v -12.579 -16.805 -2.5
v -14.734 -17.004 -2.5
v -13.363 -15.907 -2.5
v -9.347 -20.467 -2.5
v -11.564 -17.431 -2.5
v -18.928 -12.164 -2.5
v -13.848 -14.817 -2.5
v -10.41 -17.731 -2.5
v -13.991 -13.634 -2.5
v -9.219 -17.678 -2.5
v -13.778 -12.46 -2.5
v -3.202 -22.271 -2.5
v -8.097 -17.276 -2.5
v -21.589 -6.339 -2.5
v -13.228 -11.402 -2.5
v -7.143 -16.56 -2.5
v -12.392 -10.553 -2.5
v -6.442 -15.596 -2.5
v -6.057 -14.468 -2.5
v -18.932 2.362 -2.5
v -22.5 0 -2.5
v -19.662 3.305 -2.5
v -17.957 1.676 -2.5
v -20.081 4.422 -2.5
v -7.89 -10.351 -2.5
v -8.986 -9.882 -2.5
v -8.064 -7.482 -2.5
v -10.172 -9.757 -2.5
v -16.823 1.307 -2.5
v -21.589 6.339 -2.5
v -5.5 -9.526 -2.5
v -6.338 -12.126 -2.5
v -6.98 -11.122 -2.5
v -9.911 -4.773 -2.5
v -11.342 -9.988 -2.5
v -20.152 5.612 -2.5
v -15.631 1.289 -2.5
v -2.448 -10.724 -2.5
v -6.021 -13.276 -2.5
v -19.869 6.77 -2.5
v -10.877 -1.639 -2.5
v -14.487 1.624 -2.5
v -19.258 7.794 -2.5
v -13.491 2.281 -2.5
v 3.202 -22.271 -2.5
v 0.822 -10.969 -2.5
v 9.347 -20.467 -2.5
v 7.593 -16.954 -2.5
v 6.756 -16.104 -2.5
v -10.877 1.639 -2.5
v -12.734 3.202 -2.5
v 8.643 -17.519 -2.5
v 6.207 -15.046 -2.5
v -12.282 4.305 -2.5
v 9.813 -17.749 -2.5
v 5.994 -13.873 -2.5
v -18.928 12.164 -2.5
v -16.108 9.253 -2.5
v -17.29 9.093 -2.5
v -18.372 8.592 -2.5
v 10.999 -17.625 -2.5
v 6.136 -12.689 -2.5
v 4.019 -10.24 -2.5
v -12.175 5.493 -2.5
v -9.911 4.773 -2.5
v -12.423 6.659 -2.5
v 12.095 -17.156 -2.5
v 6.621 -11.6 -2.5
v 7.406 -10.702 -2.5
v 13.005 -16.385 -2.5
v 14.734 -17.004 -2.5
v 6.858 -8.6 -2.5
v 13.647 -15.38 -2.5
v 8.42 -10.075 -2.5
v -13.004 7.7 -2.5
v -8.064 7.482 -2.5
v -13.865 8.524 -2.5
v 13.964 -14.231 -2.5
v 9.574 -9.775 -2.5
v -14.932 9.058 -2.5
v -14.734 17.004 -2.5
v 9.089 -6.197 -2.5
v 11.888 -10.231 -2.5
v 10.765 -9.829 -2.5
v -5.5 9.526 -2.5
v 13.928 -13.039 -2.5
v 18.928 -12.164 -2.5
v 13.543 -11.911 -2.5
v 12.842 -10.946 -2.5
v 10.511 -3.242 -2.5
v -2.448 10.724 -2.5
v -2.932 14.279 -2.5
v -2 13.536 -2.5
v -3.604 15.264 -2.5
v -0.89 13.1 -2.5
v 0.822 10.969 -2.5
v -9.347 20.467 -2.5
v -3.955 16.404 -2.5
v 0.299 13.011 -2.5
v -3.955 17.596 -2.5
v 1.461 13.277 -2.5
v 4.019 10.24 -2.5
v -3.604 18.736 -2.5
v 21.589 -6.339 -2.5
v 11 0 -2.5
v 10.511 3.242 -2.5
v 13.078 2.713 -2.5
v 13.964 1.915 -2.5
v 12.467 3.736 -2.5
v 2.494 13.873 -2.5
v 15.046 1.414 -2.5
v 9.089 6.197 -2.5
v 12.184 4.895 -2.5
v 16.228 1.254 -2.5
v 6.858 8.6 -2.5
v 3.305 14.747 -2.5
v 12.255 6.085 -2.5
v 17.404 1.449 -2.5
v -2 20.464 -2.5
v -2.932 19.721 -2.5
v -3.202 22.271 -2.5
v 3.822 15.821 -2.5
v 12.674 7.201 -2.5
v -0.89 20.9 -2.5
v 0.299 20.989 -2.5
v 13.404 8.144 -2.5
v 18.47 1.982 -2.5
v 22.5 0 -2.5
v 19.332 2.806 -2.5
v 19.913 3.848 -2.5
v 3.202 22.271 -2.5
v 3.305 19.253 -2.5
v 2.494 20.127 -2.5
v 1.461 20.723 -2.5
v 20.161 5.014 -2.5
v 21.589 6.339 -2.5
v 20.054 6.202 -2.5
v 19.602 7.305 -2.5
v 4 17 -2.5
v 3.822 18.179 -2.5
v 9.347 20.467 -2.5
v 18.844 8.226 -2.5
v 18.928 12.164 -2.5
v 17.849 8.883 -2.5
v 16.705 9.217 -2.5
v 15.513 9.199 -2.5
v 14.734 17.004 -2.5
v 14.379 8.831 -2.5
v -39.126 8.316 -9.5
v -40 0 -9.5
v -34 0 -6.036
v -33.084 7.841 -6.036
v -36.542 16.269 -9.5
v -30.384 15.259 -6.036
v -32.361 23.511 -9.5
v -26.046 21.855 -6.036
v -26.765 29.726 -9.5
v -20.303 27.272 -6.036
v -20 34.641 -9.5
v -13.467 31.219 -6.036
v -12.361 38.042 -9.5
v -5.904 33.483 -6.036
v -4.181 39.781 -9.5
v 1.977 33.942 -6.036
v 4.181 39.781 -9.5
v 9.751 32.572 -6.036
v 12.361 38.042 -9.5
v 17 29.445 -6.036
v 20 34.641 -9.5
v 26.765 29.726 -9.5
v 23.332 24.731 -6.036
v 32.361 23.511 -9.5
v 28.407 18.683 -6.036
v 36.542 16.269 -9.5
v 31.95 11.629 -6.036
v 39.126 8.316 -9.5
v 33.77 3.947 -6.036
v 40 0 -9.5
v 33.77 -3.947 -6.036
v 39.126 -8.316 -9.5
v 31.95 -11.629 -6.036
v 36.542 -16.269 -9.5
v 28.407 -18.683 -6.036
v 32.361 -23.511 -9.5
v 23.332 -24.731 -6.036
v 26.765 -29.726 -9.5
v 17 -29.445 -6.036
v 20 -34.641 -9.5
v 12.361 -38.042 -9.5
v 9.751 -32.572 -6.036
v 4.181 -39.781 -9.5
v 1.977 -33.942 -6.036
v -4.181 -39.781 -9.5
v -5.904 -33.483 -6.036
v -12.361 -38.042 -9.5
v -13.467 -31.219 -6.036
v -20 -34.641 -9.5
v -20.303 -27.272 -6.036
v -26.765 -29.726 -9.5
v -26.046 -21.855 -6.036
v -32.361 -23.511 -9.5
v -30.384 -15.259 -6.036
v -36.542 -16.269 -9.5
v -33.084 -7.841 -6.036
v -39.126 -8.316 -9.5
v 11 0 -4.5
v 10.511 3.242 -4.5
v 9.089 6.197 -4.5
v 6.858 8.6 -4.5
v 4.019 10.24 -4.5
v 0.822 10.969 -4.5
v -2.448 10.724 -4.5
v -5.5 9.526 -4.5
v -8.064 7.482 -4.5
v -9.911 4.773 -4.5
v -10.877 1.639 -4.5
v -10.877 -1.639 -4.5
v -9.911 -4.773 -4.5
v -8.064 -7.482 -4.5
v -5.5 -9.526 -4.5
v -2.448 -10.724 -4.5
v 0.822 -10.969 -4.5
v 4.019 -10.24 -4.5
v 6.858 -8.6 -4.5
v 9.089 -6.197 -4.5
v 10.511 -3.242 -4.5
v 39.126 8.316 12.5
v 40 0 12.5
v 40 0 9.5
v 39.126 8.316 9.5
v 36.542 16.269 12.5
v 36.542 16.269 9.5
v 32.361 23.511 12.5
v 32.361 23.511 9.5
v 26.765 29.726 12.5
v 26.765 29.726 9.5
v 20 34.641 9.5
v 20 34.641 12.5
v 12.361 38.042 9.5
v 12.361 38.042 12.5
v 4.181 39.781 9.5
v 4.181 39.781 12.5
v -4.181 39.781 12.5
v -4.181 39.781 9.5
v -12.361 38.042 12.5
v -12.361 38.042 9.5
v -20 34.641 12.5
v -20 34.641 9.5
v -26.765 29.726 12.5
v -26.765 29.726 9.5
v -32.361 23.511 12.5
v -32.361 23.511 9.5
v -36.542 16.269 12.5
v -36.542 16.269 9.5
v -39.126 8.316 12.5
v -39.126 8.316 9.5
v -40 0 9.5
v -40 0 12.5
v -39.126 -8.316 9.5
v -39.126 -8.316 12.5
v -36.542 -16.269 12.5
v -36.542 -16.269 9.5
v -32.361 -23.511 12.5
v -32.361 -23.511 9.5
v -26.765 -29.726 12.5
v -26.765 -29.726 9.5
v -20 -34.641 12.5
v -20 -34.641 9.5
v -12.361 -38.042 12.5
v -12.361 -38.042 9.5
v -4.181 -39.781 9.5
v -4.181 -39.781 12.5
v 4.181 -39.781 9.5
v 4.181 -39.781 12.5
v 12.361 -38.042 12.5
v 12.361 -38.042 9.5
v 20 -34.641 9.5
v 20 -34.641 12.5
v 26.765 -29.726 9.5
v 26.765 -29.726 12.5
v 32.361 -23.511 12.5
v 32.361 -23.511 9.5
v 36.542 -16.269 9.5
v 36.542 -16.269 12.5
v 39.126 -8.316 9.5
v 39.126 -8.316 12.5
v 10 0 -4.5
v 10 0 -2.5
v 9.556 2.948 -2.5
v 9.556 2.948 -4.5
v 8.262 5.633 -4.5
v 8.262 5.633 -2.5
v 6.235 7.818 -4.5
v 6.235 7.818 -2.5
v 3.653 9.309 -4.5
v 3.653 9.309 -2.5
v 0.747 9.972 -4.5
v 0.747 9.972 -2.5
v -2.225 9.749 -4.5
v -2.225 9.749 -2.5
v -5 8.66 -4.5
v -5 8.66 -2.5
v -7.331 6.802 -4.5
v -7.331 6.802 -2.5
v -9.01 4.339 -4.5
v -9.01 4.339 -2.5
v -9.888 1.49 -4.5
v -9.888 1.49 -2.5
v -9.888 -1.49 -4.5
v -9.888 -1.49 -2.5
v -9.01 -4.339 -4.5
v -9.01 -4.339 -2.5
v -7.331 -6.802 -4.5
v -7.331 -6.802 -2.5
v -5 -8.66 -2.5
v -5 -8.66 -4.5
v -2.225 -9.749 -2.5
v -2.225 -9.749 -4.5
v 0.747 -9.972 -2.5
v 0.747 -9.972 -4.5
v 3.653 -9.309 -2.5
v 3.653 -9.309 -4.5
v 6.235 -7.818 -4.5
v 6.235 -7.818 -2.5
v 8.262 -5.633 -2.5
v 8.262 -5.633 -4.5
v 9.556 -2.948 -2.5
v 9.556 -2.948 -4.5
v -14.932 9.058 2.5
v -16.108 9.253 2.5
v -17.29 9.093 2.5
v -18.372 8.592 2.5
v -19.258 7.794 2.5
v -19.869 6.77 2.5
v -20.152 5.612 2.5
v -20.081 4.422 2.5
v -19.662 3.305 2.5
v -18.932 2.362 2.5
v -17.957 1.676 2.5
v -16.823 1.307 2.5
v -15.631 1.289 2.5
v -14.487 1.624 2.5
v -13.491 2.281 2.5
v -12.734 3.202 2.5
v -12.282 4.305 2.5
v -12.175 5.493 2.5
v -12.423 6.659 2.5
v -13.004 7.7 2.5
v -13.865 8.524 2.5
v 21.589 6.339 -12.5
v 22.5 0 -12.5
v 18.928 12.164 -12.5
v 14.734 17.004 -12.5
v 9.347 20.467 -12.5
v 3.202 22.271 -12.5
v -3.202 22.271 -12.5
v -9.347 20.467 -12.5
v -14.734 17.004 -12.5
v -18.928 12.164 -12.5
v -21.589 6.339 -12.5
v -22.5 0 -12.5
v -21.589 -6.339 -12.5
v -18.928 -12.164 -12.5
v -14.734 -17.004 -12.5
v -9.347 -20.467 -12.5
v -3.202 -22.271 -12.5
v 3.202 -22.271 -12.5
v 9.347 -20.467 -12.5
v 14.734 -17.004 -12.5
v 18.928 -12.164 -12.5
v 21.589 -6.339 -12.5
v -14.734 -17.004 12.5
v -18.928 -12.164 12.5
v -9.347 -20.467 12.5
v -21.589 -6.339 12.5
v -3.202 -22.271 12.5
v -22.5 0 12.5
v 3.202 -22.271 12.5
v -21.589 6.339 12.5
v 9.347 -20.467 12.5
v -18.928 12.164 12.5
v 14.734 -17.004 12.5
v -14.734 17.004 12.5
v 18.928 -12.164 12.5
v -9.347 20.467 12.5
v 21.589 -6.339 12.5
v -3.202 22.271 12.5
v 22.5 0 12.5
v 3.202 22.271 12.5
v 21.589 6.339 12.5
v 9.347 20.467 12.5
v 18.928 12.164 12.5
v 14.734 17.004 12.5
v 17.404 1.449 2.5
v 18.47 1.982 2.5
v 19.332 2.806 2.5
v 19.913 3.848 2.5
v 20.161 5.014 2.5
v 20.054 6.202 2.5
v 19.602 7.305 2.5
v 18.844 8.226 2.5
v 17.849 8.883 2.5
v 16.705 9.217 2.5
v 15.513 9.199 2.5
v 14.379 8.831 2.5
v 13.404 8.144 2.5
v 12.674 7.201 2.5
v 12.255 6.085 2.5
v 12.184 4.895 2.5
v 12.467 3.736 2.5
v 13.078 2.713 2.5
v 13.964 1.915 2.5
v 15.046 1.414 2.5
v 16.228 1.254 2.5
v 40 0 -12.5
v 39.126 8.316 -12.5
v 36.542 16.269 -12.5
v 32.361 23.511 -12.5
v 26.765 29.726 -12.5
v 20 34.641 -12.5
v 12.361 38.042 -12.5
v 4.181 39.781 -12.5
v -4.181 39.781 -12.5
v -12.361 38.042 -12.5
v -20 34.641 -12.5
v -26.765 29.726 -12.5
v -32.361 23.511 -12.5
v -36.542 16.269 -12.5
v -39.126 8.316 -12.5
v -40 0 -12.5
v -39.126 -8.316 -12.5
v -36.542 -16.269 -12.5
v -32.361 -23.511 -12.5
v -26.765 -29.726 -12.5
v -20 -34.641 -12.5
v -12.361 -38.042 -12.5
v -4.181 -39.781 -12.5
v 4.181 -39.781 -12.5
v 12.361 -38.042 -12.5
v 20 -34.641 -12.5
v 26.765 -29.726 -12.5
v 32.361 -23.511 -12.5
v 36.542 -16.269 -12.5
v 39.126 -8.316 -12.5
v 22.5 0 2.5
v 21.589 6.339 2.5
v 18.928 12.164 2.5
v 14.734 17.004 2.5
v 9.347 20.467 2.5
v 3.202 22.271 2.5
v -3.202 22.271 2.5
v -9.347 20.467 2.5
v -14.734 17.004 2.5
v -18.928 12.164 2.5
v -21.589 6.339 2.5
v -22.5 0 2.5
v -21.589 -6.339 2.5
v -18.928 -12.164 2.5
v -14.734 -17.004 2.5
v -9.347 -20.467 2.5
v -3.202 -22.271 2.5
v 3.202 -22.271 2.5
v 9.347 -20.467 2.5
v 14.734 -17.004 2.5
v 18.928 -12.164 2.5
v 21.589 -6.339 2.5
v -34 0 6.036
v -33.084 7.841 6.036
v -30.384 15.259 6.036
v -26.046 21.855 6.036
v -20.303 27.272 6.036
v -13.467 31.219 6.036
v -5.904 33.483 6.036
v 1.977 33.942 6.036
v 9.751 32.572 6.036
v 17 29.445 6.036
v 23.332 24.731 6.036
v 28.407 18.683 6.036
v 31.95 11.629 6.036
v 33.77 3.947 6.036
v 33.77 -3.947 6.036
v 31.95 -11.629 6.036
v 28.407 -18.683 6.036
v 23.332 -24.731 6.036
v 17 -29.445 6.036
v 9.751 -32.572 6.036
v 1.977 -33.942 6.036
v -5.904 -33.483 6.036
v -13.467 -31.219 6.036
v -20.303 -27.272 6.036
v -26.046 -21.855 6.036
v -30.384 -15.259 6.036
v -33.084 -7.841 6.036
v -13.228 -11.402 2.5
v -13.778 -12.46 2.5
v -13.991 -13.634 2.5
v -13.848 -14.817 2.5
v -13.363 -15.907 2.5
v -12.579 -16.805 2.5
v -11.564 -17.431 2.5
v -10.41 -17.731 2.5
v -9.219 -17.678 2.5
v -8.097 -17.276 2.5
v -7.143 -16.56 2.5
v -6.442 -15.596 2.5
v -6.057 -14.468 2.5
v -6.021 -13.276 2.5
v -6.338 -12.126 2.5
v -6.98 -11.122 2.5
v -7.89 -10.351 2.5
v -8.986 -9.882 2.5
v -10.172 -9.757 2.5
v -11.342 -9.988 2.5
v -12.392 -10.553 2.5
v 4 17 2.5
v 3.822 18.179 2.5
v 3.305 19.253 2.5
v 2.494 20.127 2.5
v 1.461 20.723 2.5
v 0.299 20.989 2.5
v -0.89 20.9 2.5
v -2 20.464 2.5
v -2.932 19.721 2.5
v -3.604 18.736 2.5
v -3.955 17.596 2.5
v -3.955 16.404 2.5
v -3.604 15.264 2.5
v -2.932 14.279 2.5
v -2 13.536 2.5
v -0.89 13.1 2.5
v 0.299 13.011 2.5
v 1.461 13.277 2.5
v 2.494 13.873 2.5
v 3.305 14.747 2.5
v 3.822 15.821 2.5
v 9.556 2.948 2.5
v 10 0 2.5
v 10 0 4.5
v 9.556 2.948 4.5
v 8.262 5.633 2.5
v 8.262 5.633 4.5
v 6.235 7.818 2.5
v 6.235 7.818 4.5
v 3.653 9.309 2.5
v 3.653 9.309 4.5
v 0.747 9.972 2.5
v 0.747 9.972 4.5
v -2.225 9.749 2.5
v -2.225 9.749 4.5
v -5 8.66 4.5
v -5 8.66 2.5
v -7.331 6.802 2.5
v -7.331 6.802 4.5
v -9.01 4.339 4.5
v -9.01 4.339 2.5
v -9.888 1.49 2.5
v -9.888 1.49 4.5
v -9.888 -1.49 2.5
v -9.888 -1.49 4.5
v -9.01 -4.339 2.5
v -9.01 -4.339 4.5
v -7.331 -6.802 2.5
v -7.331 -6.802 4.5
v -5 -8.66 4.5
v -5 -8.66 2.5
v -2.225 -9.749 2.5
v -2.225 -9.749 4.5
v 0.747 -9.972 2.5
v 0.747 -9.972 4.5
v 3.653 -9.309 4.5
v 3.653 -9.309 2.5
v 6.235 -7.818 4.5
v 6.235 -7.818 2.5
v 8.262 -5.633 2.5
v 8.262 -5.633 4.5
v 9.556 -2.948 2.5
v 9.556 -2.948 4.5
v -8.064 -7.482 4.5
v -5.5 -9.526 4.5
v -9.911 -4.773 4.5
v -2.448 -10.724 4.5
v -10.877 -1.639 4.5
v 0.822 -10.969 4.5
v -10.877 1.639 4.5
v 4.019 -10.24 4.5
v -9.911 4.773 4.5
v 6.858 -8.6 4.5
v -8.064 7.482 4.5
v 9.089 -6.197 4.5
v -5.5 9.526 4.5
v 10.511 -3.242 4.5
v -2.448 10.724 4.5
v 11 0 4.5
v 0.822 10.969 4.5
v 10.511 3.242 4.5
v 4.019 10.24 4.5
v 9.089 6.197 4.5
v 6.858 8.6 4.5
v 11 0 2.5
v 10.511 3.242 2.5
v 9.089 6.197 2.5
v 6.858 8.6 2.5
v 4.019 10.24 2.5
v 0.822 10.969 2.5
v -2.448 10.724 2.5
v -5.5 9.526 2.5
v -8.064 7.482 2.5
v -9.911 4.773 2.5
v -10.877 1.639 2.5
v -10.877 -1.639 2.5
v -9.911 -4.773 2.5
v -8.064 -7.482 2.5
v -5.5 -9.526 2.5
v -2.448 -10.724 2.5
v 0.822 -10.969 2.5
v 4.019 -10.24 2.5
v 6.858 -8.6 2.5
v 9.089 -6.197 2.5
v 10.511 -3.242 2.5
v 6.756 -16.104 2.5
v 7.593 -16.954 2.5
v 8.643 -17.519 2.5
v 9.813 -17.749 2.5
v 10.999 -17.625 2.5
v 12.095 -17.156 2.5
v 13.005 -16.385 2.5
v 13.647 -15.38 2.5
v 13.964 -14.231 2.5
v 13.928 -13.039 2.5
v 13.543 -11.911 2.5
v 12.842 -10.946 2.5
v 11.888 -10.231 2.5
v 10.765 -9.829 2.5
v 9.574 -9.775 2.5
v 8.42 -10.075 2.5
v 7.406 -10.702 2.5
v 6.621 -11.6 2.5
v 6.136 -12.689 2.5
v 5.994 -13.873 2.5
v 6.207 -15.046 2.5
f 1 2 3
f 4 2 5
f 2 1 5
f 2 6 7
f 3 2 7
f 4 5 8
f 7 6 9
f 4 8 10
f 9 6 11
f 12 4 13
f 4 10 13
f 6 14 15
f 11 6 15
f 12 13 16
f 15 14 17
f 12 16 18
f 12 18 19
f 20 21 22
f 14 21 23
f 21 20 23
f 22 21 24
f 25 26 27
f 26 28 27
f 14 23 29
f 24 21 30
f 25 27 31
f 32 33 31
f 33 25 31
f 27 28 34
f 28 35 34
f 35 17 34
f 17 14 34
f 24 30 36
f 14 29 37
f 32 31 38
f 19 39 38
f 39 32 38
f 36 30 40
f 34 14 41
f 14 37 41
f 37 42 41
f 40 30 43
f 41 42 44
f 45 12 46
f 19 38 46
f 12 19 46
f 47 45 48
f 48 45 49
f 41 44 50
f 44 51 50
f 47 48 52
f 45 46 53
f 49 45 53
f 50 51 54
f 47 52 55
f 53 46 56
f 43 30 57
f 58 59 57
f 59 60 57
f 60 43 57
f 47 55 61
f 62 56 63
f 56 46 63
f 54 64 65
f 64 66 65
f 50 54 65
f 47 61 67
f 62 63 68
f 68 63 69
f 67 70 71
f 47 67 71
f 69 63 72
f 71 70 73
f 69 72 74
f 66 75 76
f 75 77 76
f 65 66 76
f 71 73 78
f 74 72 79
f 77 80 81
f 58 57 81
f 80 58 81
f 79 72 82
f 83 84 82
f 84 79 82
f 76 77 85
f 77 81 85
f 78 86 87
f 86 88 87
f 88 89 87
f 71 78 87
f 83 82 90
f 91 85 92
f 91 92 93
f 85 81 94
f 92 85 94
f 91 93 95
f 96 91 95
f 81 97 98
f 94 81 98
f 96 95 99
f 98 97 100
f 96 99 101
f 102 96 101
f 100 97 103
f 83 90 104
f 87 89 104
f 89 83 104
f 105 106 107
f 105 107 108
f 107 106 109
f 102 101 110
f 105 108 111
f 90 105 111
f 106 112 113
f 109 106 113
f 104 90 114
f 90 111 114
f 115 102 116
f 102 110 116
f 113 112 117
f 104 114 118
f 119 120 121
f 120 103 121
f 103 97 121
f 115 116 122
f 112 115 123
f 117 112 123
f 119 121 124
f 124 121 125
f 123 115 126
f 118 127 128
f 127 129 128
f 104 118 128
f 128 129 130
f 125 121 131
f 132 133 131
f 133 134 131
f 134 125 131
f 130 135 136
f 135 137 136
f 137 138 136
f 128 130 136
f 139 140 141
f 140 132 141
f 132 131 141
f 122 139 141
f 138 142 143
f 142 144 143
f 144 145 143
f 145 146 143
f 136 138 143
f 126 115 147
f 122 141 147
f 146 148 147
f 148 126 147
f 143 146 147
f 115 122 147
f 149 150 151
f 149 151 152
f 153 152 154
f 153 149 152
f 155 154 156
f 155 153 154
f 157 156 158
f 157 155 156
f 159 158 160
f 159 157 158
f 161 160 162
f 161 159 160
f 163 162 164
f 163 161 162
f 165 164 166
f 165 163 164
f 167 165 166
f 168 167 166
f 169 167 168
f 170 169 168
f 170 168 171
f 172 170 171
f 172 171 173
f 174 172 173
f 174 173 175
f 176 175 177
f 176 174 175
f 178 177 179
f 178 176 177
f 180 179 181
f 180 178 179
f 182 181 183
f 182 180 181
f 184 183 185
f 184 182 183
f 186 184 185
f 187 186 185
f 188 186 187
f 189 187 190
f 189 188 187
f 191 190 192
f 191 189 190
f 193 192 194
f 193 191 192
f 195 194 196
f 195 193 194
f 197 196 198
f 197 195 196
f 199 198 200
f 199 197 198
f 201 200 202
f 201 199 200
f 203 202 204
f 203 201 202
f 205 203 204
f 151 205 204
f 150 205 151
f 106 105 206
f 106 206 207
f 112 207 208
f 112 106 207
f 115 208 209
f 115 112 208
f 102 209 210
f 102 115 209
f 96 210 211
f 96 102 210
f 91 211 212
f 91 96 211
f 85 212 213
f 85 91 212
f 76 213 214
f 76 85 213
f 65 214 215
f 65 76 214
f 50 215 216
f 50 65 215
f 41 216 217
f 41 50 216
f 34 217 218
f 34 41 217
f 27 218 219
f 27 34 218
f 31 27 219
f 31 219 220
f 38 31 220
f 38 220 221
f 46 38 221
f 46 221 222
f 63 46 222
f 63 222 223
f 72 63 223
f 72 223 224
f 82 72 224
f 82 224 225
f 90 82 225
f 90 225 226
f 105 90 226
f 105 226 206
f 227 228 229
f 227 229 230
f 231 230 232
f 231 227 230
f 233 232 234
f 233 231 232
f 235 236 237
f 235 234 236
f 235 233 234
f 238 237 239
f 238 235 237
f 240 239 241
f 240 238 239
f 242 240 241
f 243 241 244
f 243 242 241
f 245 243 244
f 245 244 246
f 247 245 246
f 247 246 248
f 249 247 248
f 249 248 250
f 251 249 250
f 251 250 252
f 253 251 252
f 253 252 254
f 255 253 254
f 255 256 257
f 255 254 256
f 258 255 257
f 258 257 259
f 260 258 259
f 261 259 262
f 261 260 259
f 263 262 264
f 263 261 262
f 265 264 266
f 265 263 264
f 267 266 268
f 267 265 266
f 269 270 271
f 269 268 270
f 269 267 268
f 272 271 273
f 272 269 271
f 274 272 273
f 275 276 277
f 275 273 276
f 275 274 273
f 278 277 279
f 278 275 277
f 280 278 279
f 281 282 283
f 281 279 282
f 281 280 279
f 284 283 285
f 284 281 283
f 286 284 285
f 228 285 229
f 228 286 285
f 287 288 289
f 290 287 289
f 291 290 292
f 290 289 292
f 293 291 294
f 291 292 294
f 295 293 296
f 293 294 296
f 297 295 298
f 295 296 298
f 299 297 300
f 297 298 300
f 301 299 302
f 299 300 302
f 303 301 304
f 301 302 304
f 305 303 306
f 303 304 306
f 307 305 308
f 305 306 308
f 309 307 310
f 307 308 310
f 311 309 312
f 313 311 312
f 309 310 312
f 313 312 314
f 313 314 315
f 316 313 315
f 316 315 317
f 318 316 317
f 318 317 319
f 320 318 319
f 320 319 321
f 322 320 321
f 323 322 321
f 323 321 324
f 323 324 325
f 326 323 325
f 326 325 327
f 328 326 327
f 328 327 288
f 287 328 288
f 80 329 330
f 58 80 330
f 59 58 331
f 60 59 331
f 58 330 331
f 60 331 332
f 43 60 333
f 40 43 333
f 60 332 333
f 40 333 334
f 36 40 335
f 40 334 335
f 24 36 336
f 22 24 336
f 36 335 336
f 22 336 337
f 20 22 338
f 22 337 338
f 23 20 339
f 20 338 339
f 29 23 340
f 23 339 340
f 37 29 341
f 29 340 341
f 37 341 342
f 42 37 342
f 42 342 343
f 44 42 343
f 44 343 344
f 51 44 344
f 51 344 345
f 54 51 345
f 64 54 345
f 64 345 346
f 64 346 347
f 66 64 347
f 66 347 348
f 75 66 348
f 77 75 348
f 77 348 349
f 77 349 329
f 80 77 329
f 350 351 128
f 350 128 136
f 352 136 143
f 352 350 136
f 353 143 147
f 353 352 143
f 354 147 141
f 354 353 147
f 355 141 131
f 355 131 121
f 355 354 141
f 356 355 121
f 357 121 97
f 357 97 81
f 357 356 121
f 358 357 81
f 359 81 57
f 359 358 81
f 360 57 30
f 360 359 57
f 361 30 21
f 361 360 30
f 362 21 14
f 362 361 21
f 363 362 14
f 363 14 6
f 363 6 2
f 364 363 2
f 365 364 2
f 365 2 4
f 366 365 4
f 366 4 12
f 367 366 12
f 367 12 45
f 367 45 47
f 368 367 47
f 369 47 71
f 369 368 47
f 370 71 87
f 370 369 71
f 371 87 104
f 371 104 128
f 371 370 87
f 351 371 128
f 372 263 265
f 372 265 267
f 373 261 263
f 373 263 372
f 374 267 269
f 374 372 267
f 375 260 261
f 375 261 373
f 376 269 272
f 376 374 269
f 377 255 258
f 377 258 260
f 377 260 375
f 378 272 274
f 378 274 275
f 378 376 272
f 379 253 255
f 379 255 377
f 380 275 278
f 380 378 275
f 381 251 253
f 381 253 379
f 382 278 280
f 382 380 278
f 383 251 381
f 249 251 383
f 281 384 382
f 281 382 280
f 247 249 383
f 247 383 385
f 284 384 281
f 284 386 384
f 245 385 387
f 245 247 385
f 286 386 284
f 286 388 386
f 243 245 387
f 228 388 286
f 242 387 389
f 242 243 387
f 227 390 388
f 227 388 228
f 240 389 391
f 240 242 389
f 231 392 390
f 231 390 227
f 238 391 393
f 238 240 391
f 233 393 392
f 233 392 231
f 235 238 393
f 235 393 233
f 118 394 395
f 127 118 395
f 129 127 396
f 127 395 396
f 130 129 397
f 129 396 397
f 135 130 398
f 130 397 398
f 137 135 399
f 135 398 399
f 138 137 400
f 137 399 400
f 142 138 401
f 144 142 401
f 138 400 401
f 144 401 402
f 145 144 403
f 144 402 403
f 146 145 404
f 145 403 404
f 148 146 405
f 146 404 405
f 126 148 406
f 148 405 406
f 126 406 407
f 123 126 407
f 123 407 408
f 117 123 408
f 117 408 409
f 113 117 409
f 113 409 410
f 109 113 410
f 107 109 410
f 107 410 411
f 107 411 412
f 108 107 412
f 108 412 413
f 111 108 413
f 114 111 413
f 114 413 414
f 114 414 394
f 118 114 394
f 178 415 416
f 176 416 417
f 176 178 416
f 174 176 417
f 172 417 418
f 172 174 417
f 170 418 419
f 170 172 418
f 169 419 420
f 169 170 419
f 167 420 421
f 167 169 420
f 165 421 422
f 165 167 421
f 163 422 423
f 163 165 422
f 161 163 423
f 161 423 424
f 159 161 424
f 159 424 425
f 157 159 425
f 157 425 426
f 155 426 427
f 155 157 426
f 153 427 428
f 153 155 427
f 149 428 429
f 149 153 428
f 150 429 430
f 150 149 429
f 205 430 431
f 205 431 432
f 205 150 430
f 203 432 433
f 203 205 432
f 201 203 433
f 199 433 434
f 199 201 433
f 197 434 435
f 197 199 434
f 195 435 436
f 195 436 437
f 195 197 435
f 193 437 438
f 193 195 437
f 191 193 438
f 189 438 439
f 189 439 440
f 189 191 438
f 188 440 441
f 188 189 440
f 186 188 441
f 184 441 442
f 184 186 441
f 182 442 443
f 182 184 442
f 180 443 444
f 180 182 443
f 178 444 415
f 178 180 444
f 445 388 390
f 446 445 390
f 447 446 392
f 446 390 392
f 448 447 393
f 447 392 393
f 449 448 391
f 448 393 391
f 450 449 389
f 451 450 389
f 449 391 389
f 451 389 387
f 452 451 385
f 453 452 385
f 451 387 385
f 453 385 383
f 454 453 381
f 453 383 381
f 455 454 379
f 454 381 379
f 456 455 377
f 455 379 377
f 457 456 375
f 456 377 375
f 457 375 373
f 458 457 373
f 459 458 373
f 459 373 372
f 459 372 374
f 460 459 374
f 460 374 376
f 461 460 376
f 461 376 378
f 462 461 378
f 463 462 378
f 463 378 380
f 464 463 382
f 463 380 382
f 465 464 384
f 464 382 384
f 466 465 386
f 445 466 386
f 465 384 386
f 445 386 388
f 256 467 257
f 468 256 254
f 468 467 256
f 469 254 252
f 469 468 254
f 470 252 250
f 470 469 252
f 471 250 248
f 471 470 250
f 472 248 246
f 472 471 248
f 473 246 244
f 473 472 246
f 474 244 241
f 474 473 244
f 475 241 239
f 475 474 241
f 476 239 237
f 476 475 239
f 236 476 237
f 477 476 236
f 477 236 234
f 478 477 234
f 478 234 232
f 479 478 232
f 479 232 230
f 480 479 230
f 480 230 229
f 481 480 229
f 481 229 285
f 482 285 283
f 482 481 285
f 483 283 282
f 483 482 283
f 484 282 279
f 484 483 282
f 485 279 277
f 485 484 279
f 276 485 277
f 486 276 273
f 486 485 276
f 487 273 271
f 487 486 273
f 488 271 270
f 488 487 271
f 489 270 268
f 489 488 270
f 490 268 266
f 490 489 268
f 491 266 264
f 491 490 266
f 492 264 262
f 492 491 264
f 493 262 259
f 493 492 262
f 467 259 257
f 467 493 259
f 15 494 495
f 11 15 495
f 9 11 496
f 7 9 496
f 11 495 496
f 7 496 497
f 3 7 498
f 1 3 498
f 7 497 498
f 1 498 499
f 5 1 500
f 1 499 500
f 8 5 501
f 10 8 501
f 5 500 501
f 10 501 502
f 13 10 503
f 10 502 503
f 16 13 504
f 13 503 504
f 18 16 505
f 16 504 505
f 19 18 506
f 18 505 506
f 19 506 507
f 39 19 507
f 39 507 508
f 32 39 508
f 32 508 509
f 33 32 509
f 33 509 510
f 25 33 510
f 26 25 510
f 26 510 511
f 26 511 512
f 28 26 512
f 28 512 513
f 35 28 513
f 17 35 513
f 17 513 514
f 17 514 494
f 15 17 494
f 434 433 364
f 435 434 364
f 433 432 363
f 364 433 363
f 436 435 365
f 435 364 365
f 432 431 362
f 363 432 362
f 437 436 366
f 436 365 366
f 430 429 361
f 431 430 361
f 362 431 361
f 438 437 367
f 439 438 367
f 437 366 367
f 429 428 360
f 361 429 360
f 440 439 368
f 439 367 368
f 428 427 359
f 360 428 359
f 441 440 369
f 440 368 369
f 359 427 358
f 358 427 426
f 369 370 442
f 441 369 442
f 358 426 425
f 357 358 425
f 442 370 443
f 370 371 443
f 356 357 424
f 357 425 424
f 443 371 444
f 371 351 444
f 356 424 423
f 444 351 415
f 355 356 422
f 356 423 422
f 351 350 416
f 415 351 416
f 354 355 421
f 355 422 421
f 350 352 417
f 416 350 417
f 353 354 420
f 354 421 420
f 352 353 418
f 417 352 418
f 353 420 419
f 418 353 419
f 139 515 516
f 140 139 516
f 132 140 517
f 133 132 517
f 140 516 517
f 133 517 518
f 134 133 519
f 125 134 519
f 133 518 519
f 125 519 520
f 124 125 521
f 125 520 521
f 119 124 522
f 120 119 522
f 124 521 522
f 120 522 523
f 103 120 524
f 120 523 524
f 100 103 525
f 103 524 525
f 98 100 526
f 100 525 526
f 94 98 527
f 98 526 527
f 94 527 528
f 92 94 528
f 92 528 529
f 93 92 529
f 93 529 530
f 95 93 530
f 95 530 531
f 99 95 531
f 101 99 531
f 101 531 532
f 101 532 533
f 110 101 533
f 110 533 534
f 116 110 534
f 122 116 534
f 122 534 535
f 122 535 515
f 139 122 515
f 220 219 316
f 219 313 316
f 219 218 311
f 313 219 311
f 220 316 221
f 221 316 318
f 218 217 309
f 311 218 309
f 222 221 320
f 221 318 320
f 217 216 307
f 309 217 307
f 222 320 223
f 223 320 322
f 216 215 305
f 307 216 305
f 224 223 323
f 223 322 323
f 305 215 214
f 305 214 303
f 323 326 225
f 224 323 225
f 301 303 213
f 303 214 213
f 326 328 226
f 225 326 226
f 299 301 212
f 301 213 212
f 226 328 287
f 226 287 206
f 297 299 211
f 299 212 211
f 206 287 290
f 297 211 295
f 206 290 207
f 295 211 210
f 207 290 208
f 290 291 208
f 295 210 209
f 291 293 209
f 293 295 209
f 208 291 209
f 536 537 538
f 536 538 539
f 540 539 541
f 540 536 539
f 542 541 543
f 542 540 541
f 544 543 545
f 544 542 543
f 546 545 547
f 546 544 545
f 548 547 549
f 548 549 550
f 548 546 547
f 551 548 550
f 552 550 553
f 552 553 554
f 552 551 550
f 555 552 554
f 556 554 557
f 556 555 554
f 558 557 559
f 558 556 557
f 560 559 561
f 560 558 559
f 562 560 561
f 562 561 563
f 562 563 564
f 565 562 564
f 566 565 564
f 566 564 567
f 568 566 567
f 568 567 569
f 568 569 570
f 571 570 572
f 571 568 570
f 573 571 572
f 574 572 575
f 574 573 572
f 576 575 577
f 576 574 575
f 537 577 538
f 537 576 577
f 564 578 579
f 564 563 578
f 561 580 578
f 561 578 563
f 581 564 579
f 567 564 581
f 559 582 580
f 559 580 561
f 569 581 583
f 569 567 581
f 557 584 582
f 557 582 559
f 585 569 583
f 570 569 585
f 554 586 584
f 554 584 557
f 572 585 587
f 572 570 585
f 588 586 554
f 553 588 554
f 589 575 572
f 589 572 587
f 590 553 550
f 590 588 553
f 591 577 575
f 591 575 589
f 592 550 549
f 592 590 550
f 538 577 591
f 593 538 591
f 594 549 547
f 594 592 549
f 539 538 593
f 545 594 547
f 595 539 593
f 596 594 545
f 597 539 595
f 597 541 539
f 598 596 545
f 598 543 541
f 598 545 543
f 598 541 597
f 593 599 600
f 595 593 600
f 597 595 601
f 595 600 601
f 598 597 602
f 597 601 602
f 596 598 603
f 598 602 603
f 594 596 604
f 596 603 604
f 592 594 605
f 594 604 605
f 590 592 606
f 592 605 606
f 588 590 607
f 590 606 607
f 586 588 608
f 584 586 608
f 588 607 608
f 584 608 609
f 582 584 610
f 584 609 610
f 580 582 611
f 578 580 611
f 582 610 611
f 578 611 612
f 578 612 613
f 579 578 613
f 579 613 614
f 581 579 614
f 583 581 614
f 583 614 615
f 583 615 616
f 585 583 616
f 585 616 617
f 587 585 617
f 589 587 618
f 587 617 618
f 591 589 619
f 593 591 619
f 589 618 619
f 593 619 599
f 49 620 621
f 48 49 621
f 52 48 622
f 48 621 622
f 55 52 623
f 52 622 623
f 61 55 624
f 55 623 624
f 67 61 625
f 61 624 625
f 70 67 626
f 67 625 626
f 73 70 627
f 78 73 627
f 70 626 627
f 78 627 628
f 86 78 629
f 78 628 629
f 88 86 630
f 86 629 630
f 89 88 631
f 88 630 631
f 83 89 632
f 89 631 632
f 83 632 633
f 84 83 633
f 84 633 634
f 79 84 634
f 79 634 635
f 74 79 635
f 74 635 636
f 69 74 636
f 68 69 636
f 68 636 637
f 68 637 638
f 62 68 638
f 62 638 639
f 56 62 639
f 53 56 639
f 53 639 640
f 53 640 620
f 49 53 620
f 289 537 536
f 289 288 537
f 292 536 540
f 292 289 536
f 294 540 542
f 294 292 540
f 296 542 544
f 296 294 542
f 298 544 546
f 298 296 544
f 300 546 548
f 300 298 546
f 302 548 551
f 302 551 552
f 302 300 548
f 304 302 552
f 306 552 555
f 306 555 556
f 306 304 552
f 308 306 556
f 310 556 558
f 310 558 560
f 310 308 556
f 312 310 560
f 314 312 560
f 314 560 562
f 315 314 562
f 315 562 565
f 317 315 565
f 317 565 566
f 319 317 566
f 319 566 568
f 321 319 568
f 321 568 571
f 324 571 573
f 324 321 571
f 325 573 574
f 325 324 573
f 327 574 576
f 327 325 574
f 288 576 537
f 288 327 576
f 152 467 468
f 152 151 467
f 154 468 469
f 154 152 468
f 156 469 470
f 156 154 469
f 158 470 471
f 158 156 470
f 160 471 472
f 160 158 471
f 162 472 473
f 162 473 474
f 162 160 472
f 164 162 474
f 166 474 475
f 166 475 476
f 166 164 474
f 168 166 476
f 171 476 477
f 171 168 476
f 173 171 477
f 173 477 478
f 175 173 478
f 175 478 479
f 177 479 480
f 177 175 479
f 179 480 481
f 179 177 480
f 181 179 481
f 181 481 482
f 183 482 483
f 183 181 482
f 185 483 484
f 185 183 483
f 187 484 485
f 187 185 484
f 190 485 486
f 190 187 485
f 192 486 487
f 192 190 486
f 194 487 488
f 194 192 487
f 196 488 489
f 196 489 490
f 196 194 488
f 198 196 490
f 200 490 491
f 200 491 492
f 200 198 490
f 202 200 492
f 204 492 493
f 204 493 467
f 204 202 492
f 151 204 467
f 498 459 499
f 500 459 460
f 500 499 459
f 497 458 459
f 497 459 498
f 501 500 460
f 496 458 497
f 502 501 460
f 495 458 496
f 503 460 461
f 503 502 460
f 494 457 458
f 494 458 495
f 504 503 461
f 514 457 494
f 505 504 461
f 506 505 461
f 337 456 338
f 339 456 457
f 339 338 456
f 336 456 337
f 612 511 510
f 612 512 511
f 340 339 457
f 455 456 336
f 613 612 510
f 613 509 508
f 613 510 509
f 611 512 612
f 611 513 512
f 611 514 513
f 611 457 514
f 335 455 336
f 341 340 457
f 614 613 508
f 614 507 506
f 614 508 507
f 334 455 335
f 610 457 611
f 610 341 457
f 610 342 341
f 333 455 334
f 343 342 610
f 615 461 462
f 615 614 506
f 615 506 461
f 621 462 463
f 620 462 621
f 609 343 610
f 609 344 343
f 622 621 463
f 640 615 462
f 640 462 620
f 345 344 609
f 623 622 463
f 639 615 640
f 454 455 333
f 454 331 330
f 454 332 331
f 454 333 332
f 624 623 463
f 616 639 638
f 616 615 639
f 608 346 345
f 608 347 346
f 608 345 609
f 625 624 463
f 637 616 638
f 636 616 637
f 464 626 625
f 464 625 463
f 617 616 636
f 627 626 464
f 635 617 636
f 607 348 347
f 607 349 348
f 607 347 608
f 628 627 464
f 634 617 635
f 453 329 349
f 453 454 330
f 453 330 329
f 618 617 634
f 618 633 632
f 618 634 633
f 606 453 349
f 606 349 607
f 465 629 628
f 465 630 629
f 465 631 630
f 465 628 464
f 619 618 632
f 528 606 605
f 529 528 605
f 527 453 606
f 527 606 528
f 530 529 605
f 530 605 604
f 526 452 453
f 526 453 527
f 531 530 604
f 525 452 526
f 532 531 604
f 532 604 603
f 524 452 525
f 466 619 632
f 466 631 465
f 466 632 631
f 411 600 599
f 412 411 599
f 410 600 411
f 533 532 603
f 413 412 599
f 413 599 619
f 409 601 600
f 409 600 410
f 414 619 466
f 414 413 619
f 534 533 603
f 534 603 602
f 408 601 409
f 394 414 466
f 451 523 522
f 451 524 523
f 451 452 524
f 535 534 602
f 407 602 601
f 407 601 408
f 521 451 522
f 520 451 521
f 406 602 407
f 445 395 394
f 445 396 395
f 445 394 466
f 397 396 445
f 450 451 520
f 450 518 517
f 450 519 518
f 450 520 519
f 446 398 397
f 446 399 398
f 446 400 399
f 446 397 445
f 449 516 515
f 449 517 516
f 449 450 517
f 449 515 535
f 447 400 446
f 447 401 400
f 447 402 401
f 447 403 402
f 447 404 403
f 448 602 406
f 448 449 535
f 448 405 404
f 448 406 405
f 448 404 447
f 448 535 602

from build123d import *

# Parameters (mm, degrees)
SKETCH1_R                = 40
SKETCH1_R_2              = 10
BOSS_EXTRUDE1_DEPTH      = 12.5
SKETCH2_R                = 22.5
CUT_EXTRUDE1_DEPTH       = 10
SKETCH3_R                = 4
CUT_EXTRUDE2_DEPTH       = 16
CIRPATTERN1_COUNT        = 5
SKETCH4_R                = 11
SKETCH4_R_2              = 10
BOSS_EXTRUDE2_DEPTH      = 2
BOSS_EXTRUDE2_DEPTH_BACK = 7


with BuildPart() as part:
    # Sketch1 → Boss-Extrude1 (new body, symmetric)
    with BuildSketch(Plane.XY):
        Circle(SKETCH1_R)
        Circle(SKETCH1_R_2, mode=Mode.SUBTRACT)
    extrude(amount=BOSS_EXTRUDE1_DEPTH, both=True)

    # Sketch2 → Cut-Extrude1 (cut)
    with BuildSketch(Plane.XY.offset(12.5)):
        Circle(SKETCH2_R)
    cut_extrude1 = extrude(amount=-CUT_EXTRUDE1_DEPTH, mode=Mode.SUBTRACT)

    # Mirror1: Cut-Extrude1 across plane
    add(cut_extrude1.mirror(Plane.XY), mode=Mode.SUBTRACT)

    # Sketch3 → Cut-Extrude2 (cut, through all)
    with BuildSketch(Plane.XY.offset(2.5)):
        with Locations((0, 17)):
            Circle(SKETCH3_R)
    cut_extrude2 = extrude(amount=-CUT_EXTRUDE2_DEPTH, mode=Mode.SUBTRACT)

    # CirPattern1: Cut-Extrude2 ×5 about axis
    cirpattern1_axis = Axis((0, 0, 0), (0, 0, 1))
    for i in range(1, CIRPATTERN1_COUNT):
        add(cut_extrude2.rotate(cirpattern1_axis, i * 360 / CIRPATTERN1_COUNT), mode=Mode.SUBTRACT)

    # Sketch4 → Boss-Extrude2 (add, two sides)
    with BuildSketch(Plane.XY.offset(2.5)) as boss_extrude2_sk:
        Circle(SKETCH4_R)
        Circle(SKETCH4_R_2, mode=Mode.SUBTRACT)
    extrude(amount=BOSS_EXTRUDE2_DEPTH)
    extrude(boss_extrude2_sk.sketch, amount=-BOSS_EXTRUDE2_DEPTH_BACK)

    # Sketch5 → Cut-Revolve1 (revolve, cut)
    with BuildSketch(Plane(origin=(0, 0, 0), x_dir=(1, 0, 0), z_dir=(0, 1, 0))):
        Polygon((-40, 9.5), (-40, -9.5), (-34, -6.036086587), (-34, 6.035898385), align=None)
    revolve(axis=Axis((0, 0, 0), (0, 0, -1)), mode=Mode.SUBTRACT)


solid = part.part
